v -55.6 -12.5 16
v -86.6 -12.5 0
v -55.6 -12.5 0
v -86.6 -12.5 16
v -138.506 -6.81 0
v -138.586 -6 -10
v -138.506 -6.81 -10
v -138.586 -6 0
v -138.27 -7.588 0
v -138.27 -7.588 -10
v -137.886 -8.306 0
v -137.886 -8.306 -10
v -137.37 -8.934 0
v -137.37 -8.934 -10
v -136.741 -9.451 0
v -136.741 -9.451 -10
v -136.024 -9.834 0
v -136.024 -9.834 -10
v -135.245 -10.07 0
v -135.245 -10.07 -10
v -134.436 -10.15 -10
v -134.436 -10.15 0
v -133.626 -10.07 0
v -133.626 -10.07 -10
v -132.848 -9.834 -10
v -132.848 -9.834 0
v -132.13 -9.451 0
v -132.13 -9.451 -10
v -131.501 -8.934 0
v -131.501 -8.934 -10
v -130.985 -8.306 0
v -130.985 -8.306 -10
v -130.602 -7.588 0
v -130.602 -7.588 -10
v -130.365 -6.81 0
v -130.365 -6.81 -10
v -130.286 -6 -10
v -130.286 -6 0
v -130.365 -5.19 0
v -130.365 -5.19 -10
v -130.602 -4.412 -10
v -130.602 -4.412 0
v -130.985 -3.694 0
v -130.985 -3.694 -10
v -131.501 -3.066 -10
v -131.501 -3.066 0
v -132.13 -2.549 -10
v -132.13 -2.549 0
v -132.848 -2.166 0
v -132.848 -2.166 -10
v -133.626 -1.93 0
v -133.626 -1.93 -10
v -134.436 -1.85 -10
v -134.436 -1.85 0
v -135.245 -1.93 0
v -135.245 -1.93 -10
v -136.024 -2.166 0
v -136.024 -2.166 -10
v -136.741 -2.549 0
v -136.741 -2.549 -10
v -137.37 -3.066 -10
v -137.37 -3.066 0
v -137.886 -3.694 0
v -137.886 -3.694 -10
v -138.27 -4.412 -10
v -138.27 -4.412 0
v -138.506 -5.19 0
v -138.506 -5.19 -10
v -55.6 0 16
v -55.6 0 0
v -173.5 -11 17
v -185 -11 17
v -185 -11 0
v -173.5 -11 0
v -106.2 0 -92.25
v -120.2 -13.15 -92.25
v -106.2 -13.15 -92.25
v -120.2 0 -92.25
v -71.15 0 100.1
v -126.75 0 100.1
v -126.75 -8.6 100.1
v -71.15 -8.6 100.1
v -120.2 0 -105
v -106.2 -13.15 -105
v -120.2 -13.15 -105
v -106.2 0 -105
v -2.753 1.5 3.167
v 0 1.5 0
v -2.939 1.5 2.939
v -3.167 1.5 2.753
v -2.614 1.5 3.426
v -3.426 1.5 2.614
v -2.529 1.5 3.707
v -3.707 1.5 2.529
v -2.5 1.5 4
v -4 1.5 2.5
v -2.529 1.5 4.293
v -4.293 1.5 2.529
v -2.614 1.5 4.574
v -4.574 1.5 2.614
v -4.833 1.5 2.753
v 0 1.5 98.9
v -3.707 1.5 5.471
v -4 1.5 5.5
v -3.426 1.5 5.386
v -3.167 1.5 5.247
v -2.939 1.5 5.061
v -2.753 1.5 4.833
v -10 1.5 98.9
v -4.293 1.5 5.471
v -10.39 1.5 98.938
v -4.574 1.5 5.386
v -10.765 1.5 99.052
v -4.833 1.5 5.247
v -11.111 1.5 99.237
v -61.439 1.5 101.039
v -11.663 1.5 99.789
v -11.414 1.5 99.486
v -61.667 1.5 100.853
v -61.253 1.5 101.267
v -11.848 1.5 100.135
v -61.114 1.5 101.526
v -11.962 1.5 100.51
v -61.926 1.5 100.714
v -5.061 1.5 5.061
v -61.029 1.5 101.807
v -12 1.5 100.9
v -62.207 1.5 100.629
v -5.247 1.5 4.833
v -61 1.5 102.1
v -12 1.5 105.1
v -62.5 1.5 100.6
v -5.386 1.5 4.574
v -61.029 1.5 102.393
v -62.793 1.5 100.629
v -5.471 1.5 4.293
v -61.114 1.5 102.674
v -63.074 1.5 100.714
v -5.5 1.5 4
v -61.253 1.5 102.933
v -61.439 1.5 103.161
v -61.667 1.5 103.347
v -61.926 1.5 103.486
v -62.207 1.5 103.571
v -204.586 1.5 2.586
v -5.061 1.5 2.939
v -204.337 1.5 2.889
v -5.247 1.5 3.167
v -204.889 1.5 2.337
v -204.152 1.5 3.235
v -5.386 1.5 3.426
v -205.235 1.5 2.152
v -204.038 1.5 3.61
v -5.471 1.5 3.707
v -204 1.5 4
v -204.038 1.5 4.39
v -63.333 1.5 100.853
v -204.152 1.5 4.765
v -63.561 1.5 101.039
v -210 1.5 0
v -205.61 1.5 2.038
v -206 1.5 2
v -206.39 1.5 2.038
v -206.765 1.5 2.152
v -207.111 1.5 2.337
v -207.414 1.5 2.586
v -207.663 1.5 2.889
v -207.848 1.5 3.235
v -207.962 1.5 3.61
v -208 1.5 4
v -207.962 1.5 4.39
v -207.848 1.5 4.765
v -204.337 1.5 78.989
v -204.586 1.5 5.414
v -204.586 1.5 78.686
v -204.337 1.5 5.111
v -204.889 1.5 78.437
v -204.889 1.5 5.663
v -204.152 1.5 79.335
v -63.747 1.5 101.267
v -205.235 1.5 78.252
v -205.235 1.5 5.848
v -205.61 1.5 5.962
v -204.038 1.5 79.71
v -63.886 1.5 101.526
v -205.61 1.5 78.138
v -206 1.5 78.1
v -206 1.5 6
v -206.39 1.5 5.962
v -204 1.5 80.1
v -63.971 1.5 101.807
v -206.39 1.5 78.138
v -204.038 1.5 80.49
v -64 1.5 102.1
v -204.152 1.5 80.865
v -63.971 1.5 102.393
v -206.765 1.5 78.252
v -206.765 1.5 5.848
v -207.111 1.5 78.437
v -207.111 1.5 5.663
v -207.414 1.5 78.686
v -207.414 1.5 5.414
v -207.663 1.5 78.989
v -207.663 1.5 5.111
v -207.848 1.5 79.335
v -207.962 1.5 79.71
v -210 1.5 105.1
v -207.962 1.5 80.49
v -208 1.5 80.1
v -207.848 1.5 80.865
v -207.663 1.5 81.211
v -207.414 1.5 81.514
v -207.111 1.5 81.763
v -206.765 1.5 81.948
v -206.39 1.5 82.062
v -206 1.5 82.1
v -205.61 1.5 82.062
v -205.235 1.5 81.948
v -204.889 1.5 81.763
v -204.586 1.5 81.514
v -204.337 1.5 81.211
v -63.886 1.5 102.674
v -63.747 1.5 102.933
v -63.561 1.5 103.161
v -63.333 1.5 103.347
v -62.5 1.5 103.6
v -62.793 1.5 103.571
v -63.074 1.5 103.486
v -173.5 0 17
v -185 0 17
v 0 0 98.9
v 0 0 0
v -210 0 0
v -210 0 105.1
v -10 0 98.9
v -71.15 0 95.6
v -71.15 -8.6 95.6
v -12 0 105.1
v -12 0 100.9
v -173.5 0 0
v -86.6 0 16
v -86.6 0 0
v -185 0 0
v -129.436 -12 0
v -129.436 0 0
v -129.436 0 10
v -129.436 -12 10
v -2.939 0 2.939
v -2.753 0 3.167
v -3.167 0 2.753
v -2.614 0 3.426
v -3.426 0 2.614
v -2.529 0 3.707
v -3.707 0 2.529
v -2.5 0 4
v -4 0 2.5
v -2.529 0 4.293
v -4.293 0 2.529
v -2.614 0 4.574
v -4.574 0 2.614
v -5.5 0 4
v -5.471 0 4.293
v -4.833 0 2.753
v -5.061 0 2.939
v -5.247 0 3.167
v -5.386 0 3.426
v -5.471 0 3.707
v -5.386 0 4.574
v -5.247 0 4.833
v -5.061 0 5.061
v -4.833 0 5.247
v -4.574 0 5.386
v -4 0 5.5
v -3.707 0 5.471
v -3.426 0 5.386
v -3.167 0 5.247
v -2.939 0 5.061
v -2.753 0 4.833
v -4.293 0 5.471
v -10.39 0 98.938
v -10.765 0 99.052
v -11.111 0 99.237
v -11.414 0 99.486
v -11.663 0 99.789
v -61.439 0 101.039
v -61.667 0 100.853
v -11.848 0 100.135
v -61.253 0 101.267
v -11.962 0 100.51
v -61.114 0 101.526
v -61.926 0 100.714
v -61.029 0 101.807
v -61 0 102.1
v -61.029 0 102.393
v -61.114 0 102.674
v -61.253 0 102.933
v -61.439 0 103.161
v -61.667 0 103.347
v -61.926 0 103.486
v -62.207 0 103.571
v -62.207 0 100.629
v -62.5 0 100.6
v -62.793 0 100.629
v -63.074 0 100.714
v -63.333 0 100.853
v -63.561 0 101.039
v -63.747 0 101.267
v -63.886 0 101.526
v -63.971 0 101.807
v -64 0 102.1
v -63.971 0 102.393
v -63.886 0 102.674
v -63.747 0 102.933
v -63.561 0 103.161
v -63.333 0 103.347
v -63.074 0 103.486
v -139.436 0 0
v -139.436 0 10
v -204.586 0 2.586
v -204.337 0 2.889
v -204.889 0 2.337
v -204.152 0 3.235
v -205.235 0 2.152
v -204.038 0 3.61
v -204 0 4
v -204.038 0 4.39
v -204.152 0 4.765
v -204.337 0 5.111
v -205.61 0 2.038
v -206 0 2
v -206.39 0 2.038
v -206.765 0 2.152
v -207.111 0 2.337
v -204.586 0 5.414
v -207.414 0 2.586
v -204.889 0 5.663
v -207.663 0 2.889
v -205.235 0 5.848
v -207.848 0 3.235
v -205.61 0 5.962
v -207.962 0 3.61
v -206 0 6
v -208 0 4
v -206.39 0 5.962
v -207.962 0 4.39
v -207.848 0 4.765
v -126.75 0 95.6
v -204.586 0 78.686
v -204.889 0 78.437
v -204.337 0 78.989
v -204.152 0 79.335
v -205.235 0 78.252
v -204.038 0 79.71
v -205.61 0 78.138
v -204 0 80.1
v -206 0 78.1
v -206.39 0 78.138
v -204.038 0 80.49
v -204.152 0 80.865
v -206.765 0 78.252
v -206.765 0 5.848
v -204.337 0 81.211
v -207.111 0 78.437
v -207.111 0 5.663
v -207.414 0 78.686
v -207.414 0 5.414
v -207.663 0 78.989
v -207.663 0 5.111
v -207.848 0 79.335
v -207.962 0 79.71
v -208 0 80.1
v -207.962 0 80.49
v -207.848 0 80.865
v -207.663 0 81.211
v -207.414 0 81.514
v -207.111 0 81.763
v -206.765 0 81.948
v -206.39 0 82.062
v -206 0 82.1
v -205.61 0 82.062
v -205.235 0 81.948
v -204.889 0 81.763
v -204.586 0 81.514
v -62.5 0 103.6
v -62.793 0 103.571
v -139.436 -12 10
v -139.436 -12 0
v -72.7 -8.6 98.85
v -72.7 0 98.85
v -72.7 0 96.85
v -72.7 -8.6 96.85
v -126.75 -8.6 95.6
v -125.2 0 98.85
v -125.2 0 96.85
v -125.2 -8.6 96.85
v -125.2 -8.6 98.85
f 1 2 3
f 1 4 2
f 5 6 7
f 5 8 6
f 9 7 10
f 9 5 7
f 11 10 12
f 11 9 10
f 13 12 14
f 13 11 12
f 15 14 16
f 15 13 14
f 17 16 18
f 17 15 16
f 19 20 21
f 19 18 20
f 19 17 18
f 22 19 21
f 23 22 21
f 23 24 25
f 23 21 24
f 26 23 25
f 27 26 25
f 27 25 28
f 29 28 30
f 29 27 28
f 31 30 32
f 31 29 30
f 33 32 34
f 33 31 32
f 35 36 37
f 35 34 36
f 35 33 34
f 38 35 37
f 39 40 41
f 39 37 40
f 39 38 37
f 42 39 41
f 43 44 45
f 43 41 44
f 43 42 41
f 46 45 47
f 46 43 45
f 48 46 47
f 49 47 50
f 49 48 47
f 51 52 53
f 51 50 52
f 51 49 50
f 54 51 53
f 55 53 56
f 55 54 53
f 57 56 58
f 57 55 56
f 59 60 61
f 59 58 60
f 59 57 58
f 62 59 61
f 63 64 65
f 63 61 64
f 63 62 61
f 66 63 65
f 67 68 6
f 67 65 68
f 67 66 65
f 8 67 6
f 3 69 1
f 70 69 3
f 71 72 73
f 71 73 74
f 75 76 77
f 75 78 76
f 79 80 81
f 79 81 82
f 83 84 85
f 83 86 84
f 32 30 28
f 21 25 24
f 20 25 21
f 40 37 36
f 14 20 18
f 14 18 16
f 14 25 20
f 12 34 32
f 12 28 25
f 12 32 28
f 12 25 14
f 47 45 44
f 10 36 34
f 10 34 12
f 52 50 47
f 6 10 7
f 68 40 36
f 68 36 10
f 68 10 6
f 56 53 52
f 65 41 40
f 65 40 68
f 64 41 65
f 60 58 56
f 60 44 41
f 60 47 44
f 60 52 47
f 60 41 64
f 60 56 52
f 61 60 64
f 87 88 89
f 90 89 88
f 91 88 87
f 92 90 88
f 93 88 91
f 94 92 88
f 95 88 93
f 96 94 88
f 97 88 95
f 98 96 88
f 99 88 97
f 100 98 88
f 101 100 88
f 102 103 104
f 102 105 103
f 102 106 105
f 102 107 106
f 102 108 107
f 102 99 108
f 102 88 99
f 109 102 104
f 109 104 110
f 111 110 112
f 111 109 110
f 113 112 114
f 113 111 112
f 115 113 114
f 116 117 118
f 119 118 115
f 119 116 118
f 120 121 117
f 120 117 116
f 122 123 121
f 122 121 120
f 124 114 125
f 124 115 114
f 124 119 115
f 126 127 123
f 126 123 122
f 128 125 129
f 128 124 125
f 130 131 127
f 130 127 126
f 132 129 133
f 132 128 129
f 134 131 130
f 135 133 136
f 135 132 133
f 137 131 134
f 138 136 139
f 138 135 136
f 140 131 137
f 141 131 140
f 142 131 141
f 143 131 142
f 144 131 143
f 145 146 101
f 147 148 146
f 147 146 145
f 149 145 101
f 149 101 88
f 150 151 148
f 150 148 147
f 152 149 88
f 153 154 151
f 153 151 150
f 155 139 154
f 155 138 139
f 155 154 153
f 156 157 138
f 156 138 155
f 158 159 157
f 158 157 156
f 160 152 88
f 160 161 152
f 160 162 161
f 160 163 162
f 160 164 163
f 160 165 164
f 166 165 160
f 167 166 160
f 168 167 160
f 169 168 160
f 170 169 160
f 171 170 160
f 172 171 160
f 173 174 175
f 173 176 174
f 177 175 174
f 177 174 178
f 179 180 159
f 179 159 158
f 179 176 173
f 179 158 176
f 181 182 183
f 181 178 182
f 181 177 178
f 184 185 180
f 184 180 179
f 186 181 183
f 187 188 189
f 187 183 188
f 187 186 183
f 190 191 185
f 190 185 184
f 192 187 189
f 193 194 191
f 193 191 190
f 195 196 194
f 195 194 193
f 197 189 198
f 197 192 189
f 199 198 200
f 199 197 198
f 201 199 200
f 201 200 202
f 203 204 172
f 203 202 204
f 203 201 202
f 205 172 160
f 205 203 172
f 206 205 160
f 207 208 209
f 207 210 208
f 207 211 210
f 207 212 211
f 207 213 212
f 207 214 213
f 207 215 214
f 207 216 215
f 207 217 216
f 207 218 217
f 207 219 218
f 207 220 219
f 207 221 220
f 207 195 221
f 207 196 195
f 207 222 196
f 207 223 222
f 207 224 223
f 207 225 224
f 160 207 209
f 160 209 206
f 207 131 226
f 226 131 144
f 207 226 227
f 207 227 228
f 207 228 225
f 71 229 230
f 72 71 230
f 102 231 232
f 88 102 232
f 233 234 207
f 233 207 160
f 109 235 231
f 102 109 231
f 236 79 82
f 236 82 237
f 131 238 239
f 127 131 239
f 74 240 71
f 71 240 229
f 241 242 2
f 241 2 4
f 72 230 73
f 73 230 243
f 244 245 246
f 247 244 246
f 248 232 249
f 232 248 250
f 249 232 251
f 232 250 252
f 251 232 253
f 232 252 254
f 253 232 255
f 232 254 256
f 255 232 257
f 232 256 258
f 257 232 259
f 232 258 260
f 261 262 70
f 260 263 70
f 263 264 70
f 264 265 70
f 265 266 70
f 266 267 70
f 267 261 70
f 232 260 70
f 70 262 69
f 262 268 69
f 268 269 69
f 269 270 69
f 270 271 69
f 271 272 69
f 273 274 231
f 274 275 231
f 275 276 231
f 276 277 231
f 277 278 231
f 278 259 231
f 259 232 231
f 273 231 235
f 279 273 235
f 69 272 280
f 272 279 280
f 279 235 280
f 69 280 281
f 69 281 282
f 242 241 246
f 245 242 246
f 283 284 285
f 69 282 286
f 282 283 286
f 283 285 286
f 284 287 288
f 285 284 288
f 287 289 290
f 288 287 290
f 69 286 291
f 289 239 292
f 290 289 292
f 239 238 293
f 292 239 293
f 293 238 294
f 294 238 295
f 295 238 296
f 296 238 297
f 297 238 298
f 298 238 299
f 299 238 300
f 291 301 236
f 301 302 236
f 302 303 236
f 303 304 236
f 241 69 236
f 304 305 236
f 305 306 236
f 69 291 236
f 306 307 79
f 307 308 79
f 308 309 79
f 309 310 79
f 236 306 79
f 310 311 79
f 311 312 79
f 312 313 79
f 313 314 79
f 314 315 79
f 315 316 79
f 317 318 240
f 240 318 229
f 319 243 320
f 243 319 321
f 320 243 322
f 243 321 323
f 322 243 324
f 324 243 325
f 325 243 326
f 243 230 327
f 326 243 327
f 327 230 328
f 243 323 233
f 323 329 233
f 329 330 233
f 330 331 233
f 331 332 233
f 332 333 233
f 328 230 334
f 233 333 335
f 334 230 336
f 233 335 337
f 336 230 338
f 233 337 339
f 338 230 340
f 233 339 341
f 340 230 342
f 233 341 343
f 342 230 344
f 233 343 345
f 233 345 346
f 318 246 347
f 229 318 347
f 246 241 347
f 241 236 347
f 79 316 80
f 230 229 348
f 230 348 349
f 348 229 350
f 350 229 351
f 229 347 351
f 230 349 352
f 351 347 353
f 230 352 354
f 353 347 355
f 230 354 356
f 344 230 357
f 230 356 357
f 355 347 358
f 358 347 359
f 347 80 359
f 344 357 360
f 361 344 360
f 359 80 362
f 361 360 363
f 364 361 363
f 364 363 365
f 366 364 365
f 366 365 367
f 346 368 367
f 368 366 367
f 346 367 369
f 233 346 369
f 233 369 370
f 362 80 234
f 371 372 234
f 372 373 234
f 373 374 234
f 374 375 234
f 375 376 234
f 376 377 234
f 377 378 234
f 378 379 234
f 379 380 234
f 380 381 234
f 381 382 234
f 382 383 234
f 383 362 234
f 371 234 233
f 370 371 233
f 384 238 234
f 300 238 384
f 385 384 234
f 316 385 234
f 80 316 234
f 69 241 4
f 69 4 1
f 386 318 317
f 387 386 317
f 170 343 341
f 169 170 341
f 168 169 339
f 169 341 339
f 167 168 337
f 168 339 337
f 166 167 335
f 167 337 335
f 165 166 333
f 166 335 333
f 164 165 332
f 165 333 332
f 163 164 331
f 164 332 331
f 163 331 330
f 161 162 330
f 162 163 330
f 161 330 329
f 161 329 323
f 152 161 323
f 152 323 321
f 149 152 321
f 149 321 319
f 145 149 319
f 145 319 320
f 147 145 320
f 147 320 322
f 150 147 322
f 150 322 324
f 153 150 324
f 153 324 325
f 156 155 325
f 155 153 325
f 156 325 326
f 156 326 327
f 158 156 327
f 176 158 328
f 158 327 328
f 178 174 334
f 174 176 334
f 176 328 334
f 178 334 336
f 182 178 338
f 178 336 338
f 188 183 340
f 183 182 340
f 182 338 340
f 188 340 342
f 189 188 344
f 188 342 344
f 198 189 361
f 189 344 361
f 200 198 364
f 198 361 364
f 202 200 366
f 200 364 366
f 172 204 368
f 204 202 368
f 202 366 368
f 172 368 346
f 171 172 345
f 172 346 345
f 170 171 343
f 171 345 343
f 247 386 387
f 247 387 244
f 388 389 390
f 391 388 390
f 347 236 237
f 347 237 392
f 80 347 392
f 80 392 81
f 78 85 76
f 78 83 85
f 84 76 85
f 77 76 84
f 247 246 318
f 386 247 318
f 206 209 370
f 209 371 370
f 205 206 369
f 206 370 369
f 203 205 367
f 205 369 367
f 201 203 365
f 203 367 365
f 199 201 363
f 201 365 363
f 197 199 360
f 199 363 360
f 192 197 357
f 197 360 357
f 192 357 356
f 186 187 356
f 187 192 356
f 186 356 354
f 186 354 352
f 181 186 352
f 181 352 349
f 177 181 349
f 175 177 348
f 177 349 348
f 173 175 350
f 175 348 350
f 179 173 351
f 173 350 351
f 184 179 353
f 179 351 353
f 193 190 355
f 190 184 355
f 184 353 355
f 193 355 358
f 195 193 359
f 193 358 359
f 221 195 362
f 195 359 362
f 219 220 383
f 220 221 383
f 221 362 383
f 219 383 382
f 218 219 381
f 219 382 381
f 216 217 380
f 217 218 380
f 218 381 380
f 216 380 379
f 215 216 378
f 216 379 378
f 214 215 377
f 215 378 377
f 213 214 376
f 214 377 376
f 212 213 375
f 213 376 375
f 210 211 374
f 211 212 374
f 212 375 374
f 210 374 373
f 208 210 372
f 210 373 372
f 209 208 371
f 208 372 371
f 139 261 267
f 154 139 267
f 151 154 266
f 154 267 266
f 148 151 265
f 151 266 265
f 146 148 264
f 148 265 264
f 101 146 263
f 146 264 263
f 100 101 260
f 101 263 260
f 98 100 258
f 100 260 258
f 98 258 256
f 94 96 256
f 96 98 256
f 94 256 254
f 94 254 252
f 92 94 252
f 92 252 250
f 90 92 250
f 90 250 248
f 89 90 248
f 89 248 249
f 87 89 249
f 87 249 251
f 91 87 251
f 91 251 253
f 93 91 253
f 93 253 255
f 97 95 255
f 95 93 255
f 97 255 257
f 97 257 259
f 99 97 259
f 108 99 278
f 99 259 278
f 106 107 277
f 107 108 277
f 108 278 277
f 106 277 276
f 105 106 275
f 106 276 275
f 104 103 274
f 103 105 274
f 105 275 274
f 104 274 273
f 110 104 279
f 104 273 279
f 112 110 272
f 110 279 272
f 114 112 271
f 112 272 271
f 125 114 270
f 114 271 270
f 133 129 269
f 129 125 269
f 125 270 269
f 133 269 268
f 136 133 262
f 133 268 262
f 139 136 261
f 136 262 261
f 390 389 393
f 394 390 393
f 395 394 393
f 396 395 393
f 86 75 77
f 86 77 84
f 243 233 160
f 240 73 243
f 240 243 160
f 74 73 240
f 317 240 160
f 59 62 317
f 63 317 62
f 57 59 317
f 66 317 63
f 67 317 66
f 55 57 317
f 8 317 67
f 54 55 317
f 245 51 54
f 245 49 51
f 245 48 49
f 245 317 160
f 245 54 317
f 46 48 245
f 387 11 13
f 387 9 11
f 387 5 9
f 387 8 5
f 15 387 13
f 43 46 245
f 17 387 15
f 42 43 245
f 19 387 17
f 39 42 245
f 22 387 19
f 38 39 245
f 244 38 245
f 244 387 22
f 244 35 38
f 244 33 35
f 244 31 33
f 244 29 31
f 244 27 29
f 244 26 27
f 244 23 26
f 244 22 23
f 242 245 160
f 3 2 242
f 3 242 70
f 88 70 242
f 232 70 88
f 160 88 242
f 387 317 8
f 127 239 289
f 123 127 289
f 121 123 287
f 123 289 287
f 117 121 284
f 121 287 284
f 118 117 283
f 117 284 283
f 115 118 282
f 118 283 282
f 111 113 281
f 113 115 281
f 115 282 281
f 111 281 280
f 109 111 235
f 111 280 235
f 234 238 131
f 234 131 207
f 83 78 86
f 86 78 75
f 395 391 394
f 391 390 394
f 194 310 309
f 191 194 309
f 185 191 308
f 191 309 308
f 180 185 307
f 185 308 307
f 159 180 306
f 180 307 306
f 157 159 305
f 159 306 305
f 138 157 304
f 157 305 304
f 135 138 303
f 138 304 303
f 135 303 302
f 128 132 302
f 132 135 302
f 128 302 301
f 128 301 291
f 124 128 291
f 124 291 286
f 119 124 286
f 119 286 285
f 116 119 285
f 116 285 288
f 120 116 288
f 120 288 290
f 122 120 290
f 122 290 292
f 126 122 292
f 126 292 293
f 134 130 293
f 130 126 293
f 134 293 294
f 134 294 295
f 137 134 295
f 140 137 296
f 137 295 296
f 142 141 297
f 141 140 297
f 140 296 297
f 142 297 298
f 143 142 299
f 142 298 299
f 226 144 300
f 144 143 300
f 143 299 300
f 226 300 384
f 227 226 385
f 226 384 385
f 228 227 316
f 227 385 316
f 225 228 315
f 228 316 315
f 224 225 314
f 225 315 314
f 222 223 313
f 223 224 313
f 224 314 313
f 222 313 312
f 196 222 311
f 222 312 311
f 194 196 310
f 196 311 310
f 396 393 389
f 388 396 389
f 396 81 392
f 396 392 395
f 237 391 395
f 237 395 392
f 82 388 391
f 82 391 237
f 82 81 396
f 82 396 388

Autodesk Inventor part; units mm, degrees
ref_plane "YZ Plane" through (0, 0, 0) normal (1, 0, 0) x (0, 1, 0)
ref_plane "XZ Plane" through (0, 0, 0) normal (0, 1, 0) x (-1, 0, 0)
ref_plane "XY Plane" through (0, 0, 0) normal (0, 0, 1) x (1, 0, 0)
sketch "Sketch1" plane through (0, 0, 0) normal (0, 1, 0) x (-1, 0, 0)
  line L0 (12, 105.1) -> (210, 105.1)
  line L1 (210, 105.1) -> (210, 0)
  line L2 (210, 0) -> (0, 0)
  circle A0 centre (4, 4) radius 1.5
  circle A1 centre (206, 4) radius 2
  circle A2 centre (206, 80.1) radius 2
  circle A3 centre (62.5, 102.1) radius 1.5
  line L3 (12, 105.1) -> (12, 100.9)
  line L4 (10, 98.9) -> (0, 98.9)
  arc A4 (10, 98.9) -> (12, 100.9) centre (10, 100.9) ccw
  line L5 (0, 98.9) -> (0, 0)
  point P0 (12, 98.9)
  dimension "d1" = 210
  dimension "d6" = 3
  dimension "d7" = 4
  dimension "d9" = 4
  dimension "d12" = 3
  dimension "d13" = 3
  dimension "d14" = 12
  dimension "d15" = 6.2
  dimension "d16" = 2
  dimension "d52" = 105.1
  dimension "d53" = 4
  dimension "d54" = 4
  dimension "d55" = 62.5
  dimension "d56" = 206
  dimension "d57" = 80.1
  dimension "d58" = 4
extrude "Extrusion1" add sketch "Sketch1" along normal blind 1.5
sketch "Sketch2" plane through (0, 0, 0) normal (0, -1, 0) x (1, 0, 0)
  line L0 (-126.75, 100.1) -> (-71.15, 100.1)
  line L1 (-71.15, 100.1) -> (-71.15, 95.6)
  line L2 (-71.15, 95.6) -> (-126.75, 95.6)
  line L3 (-126.75, 95.6) -> (-126.75, 100.1)
  line L4 (-210, 0) -> (-210, 105.1) projected
  line L5 (0, 98.9) -> (0, 0) projected
  line L6 (-72.7, 96.85) -> (-125.2, 96.85)
  line L7 (-125.2, 96.85) -> (-125.2, 98.85)
  line L8 (-125.2, 98.85) -> (-72.7, 98.85)
  line L9 (-72.7, 98.85) -> (-72.7, 96.85)
  line L10 (-210, 105.1) -> (-12, 105.1) projected
  point P0 (-126.75, 97.85)
  point P1 (-72.7, 97.85)
  point P2 (-71.15, 97.85)
  point P3 (-98.95, 98.85)
  point P4 (-98.95, 100.1)
  point P5 (-111, 105.1)
  dimension "d17" = 4.5
  dimension "d18" = 55.6
  dimension "d33" = 52.5
  dimension "d34" = 2
  dimension "d35" = 71.15
  dimension "d36" = 5
sketch "Sketch3" plane through (0, 0, 0) normal (0, -1, 0) x (1, 0, 0)
  line L0 (0, 0) -> (-210, 0) projected
  line L1 (-55.6, 0) -> (-86.6, 0)
  line L2 (-86.6, 0) -> (-86.6, 16)
  line L3 (-86.6, 16) -> (-55.6, 16)
  line L4 (-55.6, 16) -> (-55.6, 0)
  line L5 (0, 98.9) -> (0, 0) projected
  point P0 (-55.6, 8)
  point P1 (-86.6, 0)
  dimension "d23" = 55.6
  dimension "d24" = 31
  dimension "d25" = 16
extrude "Extrusion3" add sketch "Sketch3" along normal blind 12.5
sketch "Sketch4" plane through (0, 0, 0) normal (0, -1, 0) x (1, 0, 0)
  line L0 (-2.4, -105) -> (-210, -105)
  line L1 (-105, -105) -> (-120.2, -105)
  line L2 (-120.2, -105) -> (-120.2, -92.25)
  line L3 (-120.2, -92.25) -> (-106.2, -92.25)
  line L4 (-106.2, -92.25) -> (-106.2, -105)
  line L5 (-86.6, 16) -> (-86.6, 0) projected
  point P0 (0, 0)
  point P1 (-2.4, -105)
  point P2 (-120.2, -105)
  dimension "d28" = 12.75
  dimension "d29" = 14
  dimension "d32" = 19.6
extrude "Extrusion4" add sketch "Sketch4" along normal blind 13.15
extrude "Extrusion5" add sketch "Sketch2" along normal blind 8.6
sketch "Sketch5" plane through (0, 0, 0) normal (0, -1, 0) x (1, 0, 0)
  line L0 (0, 0) -> (-210, 0) projected
  line L1 (-185, 0) -> (-173.5, 0)
  line L2 (-173.5, 0) -> (-173.5, 17)
  line L3 (-173.5, 17) -> (-185, 17)
  line L4 (-185, 17) -> (-185, 0)
  line L5 (-210, 0) -> (-210, 105.1) projected
  point P0 (-173.5, 0)
  dimension "d39" = 17
  dimension "d40" = 11.5
  dimension "d43" = 25
extrude "Extrusion6" add sketch "Sketch5" along normal blind 11
sketch "Sketch6" plane through (0, 0, 0) normal (0, -1, 0) x (1, 0, 0)
  line L0 (0, 0) -> (-210, 0) projected
  line L1 (-139.4357, 0) -> (-129.4357, 0)
  line L2 (-129.4357, 0) -> (-129.4357, 10)
  line L3 (-129.4357, 10) -> (-139.4357, 10)
  line L4 (-139.4357, 10) -> (-139.4357, 0)
  point P0 (-129.4357, 0)
  dimension "d44" = 10
  dimension "d45" = 10
extrude "Extrusion7" add sketch "Sketch6" along normal blind 12
sketch "Sketch7" plane through (0, 1.5, 0) normal (0, 0, -1) x (-1, 0, 0)
  circle A0 centre (134.4357, -7.5) radius 4.15
  line L0 (139.4357, -1.5) -> (139.4357, -13.5) projected
  line L1 (139.4357, -13.5) -> (129.4357, -13.5) projected
  point P0 (0, -1.5)
  point P1 (139.4357, -7.5)
  point P2 (134.4357, -13.5)
  dimension "d48" = 8.3
extrude "Extrusion8" add sketch "Sketch7" along normal blind 10
properties part number "motherboard"
